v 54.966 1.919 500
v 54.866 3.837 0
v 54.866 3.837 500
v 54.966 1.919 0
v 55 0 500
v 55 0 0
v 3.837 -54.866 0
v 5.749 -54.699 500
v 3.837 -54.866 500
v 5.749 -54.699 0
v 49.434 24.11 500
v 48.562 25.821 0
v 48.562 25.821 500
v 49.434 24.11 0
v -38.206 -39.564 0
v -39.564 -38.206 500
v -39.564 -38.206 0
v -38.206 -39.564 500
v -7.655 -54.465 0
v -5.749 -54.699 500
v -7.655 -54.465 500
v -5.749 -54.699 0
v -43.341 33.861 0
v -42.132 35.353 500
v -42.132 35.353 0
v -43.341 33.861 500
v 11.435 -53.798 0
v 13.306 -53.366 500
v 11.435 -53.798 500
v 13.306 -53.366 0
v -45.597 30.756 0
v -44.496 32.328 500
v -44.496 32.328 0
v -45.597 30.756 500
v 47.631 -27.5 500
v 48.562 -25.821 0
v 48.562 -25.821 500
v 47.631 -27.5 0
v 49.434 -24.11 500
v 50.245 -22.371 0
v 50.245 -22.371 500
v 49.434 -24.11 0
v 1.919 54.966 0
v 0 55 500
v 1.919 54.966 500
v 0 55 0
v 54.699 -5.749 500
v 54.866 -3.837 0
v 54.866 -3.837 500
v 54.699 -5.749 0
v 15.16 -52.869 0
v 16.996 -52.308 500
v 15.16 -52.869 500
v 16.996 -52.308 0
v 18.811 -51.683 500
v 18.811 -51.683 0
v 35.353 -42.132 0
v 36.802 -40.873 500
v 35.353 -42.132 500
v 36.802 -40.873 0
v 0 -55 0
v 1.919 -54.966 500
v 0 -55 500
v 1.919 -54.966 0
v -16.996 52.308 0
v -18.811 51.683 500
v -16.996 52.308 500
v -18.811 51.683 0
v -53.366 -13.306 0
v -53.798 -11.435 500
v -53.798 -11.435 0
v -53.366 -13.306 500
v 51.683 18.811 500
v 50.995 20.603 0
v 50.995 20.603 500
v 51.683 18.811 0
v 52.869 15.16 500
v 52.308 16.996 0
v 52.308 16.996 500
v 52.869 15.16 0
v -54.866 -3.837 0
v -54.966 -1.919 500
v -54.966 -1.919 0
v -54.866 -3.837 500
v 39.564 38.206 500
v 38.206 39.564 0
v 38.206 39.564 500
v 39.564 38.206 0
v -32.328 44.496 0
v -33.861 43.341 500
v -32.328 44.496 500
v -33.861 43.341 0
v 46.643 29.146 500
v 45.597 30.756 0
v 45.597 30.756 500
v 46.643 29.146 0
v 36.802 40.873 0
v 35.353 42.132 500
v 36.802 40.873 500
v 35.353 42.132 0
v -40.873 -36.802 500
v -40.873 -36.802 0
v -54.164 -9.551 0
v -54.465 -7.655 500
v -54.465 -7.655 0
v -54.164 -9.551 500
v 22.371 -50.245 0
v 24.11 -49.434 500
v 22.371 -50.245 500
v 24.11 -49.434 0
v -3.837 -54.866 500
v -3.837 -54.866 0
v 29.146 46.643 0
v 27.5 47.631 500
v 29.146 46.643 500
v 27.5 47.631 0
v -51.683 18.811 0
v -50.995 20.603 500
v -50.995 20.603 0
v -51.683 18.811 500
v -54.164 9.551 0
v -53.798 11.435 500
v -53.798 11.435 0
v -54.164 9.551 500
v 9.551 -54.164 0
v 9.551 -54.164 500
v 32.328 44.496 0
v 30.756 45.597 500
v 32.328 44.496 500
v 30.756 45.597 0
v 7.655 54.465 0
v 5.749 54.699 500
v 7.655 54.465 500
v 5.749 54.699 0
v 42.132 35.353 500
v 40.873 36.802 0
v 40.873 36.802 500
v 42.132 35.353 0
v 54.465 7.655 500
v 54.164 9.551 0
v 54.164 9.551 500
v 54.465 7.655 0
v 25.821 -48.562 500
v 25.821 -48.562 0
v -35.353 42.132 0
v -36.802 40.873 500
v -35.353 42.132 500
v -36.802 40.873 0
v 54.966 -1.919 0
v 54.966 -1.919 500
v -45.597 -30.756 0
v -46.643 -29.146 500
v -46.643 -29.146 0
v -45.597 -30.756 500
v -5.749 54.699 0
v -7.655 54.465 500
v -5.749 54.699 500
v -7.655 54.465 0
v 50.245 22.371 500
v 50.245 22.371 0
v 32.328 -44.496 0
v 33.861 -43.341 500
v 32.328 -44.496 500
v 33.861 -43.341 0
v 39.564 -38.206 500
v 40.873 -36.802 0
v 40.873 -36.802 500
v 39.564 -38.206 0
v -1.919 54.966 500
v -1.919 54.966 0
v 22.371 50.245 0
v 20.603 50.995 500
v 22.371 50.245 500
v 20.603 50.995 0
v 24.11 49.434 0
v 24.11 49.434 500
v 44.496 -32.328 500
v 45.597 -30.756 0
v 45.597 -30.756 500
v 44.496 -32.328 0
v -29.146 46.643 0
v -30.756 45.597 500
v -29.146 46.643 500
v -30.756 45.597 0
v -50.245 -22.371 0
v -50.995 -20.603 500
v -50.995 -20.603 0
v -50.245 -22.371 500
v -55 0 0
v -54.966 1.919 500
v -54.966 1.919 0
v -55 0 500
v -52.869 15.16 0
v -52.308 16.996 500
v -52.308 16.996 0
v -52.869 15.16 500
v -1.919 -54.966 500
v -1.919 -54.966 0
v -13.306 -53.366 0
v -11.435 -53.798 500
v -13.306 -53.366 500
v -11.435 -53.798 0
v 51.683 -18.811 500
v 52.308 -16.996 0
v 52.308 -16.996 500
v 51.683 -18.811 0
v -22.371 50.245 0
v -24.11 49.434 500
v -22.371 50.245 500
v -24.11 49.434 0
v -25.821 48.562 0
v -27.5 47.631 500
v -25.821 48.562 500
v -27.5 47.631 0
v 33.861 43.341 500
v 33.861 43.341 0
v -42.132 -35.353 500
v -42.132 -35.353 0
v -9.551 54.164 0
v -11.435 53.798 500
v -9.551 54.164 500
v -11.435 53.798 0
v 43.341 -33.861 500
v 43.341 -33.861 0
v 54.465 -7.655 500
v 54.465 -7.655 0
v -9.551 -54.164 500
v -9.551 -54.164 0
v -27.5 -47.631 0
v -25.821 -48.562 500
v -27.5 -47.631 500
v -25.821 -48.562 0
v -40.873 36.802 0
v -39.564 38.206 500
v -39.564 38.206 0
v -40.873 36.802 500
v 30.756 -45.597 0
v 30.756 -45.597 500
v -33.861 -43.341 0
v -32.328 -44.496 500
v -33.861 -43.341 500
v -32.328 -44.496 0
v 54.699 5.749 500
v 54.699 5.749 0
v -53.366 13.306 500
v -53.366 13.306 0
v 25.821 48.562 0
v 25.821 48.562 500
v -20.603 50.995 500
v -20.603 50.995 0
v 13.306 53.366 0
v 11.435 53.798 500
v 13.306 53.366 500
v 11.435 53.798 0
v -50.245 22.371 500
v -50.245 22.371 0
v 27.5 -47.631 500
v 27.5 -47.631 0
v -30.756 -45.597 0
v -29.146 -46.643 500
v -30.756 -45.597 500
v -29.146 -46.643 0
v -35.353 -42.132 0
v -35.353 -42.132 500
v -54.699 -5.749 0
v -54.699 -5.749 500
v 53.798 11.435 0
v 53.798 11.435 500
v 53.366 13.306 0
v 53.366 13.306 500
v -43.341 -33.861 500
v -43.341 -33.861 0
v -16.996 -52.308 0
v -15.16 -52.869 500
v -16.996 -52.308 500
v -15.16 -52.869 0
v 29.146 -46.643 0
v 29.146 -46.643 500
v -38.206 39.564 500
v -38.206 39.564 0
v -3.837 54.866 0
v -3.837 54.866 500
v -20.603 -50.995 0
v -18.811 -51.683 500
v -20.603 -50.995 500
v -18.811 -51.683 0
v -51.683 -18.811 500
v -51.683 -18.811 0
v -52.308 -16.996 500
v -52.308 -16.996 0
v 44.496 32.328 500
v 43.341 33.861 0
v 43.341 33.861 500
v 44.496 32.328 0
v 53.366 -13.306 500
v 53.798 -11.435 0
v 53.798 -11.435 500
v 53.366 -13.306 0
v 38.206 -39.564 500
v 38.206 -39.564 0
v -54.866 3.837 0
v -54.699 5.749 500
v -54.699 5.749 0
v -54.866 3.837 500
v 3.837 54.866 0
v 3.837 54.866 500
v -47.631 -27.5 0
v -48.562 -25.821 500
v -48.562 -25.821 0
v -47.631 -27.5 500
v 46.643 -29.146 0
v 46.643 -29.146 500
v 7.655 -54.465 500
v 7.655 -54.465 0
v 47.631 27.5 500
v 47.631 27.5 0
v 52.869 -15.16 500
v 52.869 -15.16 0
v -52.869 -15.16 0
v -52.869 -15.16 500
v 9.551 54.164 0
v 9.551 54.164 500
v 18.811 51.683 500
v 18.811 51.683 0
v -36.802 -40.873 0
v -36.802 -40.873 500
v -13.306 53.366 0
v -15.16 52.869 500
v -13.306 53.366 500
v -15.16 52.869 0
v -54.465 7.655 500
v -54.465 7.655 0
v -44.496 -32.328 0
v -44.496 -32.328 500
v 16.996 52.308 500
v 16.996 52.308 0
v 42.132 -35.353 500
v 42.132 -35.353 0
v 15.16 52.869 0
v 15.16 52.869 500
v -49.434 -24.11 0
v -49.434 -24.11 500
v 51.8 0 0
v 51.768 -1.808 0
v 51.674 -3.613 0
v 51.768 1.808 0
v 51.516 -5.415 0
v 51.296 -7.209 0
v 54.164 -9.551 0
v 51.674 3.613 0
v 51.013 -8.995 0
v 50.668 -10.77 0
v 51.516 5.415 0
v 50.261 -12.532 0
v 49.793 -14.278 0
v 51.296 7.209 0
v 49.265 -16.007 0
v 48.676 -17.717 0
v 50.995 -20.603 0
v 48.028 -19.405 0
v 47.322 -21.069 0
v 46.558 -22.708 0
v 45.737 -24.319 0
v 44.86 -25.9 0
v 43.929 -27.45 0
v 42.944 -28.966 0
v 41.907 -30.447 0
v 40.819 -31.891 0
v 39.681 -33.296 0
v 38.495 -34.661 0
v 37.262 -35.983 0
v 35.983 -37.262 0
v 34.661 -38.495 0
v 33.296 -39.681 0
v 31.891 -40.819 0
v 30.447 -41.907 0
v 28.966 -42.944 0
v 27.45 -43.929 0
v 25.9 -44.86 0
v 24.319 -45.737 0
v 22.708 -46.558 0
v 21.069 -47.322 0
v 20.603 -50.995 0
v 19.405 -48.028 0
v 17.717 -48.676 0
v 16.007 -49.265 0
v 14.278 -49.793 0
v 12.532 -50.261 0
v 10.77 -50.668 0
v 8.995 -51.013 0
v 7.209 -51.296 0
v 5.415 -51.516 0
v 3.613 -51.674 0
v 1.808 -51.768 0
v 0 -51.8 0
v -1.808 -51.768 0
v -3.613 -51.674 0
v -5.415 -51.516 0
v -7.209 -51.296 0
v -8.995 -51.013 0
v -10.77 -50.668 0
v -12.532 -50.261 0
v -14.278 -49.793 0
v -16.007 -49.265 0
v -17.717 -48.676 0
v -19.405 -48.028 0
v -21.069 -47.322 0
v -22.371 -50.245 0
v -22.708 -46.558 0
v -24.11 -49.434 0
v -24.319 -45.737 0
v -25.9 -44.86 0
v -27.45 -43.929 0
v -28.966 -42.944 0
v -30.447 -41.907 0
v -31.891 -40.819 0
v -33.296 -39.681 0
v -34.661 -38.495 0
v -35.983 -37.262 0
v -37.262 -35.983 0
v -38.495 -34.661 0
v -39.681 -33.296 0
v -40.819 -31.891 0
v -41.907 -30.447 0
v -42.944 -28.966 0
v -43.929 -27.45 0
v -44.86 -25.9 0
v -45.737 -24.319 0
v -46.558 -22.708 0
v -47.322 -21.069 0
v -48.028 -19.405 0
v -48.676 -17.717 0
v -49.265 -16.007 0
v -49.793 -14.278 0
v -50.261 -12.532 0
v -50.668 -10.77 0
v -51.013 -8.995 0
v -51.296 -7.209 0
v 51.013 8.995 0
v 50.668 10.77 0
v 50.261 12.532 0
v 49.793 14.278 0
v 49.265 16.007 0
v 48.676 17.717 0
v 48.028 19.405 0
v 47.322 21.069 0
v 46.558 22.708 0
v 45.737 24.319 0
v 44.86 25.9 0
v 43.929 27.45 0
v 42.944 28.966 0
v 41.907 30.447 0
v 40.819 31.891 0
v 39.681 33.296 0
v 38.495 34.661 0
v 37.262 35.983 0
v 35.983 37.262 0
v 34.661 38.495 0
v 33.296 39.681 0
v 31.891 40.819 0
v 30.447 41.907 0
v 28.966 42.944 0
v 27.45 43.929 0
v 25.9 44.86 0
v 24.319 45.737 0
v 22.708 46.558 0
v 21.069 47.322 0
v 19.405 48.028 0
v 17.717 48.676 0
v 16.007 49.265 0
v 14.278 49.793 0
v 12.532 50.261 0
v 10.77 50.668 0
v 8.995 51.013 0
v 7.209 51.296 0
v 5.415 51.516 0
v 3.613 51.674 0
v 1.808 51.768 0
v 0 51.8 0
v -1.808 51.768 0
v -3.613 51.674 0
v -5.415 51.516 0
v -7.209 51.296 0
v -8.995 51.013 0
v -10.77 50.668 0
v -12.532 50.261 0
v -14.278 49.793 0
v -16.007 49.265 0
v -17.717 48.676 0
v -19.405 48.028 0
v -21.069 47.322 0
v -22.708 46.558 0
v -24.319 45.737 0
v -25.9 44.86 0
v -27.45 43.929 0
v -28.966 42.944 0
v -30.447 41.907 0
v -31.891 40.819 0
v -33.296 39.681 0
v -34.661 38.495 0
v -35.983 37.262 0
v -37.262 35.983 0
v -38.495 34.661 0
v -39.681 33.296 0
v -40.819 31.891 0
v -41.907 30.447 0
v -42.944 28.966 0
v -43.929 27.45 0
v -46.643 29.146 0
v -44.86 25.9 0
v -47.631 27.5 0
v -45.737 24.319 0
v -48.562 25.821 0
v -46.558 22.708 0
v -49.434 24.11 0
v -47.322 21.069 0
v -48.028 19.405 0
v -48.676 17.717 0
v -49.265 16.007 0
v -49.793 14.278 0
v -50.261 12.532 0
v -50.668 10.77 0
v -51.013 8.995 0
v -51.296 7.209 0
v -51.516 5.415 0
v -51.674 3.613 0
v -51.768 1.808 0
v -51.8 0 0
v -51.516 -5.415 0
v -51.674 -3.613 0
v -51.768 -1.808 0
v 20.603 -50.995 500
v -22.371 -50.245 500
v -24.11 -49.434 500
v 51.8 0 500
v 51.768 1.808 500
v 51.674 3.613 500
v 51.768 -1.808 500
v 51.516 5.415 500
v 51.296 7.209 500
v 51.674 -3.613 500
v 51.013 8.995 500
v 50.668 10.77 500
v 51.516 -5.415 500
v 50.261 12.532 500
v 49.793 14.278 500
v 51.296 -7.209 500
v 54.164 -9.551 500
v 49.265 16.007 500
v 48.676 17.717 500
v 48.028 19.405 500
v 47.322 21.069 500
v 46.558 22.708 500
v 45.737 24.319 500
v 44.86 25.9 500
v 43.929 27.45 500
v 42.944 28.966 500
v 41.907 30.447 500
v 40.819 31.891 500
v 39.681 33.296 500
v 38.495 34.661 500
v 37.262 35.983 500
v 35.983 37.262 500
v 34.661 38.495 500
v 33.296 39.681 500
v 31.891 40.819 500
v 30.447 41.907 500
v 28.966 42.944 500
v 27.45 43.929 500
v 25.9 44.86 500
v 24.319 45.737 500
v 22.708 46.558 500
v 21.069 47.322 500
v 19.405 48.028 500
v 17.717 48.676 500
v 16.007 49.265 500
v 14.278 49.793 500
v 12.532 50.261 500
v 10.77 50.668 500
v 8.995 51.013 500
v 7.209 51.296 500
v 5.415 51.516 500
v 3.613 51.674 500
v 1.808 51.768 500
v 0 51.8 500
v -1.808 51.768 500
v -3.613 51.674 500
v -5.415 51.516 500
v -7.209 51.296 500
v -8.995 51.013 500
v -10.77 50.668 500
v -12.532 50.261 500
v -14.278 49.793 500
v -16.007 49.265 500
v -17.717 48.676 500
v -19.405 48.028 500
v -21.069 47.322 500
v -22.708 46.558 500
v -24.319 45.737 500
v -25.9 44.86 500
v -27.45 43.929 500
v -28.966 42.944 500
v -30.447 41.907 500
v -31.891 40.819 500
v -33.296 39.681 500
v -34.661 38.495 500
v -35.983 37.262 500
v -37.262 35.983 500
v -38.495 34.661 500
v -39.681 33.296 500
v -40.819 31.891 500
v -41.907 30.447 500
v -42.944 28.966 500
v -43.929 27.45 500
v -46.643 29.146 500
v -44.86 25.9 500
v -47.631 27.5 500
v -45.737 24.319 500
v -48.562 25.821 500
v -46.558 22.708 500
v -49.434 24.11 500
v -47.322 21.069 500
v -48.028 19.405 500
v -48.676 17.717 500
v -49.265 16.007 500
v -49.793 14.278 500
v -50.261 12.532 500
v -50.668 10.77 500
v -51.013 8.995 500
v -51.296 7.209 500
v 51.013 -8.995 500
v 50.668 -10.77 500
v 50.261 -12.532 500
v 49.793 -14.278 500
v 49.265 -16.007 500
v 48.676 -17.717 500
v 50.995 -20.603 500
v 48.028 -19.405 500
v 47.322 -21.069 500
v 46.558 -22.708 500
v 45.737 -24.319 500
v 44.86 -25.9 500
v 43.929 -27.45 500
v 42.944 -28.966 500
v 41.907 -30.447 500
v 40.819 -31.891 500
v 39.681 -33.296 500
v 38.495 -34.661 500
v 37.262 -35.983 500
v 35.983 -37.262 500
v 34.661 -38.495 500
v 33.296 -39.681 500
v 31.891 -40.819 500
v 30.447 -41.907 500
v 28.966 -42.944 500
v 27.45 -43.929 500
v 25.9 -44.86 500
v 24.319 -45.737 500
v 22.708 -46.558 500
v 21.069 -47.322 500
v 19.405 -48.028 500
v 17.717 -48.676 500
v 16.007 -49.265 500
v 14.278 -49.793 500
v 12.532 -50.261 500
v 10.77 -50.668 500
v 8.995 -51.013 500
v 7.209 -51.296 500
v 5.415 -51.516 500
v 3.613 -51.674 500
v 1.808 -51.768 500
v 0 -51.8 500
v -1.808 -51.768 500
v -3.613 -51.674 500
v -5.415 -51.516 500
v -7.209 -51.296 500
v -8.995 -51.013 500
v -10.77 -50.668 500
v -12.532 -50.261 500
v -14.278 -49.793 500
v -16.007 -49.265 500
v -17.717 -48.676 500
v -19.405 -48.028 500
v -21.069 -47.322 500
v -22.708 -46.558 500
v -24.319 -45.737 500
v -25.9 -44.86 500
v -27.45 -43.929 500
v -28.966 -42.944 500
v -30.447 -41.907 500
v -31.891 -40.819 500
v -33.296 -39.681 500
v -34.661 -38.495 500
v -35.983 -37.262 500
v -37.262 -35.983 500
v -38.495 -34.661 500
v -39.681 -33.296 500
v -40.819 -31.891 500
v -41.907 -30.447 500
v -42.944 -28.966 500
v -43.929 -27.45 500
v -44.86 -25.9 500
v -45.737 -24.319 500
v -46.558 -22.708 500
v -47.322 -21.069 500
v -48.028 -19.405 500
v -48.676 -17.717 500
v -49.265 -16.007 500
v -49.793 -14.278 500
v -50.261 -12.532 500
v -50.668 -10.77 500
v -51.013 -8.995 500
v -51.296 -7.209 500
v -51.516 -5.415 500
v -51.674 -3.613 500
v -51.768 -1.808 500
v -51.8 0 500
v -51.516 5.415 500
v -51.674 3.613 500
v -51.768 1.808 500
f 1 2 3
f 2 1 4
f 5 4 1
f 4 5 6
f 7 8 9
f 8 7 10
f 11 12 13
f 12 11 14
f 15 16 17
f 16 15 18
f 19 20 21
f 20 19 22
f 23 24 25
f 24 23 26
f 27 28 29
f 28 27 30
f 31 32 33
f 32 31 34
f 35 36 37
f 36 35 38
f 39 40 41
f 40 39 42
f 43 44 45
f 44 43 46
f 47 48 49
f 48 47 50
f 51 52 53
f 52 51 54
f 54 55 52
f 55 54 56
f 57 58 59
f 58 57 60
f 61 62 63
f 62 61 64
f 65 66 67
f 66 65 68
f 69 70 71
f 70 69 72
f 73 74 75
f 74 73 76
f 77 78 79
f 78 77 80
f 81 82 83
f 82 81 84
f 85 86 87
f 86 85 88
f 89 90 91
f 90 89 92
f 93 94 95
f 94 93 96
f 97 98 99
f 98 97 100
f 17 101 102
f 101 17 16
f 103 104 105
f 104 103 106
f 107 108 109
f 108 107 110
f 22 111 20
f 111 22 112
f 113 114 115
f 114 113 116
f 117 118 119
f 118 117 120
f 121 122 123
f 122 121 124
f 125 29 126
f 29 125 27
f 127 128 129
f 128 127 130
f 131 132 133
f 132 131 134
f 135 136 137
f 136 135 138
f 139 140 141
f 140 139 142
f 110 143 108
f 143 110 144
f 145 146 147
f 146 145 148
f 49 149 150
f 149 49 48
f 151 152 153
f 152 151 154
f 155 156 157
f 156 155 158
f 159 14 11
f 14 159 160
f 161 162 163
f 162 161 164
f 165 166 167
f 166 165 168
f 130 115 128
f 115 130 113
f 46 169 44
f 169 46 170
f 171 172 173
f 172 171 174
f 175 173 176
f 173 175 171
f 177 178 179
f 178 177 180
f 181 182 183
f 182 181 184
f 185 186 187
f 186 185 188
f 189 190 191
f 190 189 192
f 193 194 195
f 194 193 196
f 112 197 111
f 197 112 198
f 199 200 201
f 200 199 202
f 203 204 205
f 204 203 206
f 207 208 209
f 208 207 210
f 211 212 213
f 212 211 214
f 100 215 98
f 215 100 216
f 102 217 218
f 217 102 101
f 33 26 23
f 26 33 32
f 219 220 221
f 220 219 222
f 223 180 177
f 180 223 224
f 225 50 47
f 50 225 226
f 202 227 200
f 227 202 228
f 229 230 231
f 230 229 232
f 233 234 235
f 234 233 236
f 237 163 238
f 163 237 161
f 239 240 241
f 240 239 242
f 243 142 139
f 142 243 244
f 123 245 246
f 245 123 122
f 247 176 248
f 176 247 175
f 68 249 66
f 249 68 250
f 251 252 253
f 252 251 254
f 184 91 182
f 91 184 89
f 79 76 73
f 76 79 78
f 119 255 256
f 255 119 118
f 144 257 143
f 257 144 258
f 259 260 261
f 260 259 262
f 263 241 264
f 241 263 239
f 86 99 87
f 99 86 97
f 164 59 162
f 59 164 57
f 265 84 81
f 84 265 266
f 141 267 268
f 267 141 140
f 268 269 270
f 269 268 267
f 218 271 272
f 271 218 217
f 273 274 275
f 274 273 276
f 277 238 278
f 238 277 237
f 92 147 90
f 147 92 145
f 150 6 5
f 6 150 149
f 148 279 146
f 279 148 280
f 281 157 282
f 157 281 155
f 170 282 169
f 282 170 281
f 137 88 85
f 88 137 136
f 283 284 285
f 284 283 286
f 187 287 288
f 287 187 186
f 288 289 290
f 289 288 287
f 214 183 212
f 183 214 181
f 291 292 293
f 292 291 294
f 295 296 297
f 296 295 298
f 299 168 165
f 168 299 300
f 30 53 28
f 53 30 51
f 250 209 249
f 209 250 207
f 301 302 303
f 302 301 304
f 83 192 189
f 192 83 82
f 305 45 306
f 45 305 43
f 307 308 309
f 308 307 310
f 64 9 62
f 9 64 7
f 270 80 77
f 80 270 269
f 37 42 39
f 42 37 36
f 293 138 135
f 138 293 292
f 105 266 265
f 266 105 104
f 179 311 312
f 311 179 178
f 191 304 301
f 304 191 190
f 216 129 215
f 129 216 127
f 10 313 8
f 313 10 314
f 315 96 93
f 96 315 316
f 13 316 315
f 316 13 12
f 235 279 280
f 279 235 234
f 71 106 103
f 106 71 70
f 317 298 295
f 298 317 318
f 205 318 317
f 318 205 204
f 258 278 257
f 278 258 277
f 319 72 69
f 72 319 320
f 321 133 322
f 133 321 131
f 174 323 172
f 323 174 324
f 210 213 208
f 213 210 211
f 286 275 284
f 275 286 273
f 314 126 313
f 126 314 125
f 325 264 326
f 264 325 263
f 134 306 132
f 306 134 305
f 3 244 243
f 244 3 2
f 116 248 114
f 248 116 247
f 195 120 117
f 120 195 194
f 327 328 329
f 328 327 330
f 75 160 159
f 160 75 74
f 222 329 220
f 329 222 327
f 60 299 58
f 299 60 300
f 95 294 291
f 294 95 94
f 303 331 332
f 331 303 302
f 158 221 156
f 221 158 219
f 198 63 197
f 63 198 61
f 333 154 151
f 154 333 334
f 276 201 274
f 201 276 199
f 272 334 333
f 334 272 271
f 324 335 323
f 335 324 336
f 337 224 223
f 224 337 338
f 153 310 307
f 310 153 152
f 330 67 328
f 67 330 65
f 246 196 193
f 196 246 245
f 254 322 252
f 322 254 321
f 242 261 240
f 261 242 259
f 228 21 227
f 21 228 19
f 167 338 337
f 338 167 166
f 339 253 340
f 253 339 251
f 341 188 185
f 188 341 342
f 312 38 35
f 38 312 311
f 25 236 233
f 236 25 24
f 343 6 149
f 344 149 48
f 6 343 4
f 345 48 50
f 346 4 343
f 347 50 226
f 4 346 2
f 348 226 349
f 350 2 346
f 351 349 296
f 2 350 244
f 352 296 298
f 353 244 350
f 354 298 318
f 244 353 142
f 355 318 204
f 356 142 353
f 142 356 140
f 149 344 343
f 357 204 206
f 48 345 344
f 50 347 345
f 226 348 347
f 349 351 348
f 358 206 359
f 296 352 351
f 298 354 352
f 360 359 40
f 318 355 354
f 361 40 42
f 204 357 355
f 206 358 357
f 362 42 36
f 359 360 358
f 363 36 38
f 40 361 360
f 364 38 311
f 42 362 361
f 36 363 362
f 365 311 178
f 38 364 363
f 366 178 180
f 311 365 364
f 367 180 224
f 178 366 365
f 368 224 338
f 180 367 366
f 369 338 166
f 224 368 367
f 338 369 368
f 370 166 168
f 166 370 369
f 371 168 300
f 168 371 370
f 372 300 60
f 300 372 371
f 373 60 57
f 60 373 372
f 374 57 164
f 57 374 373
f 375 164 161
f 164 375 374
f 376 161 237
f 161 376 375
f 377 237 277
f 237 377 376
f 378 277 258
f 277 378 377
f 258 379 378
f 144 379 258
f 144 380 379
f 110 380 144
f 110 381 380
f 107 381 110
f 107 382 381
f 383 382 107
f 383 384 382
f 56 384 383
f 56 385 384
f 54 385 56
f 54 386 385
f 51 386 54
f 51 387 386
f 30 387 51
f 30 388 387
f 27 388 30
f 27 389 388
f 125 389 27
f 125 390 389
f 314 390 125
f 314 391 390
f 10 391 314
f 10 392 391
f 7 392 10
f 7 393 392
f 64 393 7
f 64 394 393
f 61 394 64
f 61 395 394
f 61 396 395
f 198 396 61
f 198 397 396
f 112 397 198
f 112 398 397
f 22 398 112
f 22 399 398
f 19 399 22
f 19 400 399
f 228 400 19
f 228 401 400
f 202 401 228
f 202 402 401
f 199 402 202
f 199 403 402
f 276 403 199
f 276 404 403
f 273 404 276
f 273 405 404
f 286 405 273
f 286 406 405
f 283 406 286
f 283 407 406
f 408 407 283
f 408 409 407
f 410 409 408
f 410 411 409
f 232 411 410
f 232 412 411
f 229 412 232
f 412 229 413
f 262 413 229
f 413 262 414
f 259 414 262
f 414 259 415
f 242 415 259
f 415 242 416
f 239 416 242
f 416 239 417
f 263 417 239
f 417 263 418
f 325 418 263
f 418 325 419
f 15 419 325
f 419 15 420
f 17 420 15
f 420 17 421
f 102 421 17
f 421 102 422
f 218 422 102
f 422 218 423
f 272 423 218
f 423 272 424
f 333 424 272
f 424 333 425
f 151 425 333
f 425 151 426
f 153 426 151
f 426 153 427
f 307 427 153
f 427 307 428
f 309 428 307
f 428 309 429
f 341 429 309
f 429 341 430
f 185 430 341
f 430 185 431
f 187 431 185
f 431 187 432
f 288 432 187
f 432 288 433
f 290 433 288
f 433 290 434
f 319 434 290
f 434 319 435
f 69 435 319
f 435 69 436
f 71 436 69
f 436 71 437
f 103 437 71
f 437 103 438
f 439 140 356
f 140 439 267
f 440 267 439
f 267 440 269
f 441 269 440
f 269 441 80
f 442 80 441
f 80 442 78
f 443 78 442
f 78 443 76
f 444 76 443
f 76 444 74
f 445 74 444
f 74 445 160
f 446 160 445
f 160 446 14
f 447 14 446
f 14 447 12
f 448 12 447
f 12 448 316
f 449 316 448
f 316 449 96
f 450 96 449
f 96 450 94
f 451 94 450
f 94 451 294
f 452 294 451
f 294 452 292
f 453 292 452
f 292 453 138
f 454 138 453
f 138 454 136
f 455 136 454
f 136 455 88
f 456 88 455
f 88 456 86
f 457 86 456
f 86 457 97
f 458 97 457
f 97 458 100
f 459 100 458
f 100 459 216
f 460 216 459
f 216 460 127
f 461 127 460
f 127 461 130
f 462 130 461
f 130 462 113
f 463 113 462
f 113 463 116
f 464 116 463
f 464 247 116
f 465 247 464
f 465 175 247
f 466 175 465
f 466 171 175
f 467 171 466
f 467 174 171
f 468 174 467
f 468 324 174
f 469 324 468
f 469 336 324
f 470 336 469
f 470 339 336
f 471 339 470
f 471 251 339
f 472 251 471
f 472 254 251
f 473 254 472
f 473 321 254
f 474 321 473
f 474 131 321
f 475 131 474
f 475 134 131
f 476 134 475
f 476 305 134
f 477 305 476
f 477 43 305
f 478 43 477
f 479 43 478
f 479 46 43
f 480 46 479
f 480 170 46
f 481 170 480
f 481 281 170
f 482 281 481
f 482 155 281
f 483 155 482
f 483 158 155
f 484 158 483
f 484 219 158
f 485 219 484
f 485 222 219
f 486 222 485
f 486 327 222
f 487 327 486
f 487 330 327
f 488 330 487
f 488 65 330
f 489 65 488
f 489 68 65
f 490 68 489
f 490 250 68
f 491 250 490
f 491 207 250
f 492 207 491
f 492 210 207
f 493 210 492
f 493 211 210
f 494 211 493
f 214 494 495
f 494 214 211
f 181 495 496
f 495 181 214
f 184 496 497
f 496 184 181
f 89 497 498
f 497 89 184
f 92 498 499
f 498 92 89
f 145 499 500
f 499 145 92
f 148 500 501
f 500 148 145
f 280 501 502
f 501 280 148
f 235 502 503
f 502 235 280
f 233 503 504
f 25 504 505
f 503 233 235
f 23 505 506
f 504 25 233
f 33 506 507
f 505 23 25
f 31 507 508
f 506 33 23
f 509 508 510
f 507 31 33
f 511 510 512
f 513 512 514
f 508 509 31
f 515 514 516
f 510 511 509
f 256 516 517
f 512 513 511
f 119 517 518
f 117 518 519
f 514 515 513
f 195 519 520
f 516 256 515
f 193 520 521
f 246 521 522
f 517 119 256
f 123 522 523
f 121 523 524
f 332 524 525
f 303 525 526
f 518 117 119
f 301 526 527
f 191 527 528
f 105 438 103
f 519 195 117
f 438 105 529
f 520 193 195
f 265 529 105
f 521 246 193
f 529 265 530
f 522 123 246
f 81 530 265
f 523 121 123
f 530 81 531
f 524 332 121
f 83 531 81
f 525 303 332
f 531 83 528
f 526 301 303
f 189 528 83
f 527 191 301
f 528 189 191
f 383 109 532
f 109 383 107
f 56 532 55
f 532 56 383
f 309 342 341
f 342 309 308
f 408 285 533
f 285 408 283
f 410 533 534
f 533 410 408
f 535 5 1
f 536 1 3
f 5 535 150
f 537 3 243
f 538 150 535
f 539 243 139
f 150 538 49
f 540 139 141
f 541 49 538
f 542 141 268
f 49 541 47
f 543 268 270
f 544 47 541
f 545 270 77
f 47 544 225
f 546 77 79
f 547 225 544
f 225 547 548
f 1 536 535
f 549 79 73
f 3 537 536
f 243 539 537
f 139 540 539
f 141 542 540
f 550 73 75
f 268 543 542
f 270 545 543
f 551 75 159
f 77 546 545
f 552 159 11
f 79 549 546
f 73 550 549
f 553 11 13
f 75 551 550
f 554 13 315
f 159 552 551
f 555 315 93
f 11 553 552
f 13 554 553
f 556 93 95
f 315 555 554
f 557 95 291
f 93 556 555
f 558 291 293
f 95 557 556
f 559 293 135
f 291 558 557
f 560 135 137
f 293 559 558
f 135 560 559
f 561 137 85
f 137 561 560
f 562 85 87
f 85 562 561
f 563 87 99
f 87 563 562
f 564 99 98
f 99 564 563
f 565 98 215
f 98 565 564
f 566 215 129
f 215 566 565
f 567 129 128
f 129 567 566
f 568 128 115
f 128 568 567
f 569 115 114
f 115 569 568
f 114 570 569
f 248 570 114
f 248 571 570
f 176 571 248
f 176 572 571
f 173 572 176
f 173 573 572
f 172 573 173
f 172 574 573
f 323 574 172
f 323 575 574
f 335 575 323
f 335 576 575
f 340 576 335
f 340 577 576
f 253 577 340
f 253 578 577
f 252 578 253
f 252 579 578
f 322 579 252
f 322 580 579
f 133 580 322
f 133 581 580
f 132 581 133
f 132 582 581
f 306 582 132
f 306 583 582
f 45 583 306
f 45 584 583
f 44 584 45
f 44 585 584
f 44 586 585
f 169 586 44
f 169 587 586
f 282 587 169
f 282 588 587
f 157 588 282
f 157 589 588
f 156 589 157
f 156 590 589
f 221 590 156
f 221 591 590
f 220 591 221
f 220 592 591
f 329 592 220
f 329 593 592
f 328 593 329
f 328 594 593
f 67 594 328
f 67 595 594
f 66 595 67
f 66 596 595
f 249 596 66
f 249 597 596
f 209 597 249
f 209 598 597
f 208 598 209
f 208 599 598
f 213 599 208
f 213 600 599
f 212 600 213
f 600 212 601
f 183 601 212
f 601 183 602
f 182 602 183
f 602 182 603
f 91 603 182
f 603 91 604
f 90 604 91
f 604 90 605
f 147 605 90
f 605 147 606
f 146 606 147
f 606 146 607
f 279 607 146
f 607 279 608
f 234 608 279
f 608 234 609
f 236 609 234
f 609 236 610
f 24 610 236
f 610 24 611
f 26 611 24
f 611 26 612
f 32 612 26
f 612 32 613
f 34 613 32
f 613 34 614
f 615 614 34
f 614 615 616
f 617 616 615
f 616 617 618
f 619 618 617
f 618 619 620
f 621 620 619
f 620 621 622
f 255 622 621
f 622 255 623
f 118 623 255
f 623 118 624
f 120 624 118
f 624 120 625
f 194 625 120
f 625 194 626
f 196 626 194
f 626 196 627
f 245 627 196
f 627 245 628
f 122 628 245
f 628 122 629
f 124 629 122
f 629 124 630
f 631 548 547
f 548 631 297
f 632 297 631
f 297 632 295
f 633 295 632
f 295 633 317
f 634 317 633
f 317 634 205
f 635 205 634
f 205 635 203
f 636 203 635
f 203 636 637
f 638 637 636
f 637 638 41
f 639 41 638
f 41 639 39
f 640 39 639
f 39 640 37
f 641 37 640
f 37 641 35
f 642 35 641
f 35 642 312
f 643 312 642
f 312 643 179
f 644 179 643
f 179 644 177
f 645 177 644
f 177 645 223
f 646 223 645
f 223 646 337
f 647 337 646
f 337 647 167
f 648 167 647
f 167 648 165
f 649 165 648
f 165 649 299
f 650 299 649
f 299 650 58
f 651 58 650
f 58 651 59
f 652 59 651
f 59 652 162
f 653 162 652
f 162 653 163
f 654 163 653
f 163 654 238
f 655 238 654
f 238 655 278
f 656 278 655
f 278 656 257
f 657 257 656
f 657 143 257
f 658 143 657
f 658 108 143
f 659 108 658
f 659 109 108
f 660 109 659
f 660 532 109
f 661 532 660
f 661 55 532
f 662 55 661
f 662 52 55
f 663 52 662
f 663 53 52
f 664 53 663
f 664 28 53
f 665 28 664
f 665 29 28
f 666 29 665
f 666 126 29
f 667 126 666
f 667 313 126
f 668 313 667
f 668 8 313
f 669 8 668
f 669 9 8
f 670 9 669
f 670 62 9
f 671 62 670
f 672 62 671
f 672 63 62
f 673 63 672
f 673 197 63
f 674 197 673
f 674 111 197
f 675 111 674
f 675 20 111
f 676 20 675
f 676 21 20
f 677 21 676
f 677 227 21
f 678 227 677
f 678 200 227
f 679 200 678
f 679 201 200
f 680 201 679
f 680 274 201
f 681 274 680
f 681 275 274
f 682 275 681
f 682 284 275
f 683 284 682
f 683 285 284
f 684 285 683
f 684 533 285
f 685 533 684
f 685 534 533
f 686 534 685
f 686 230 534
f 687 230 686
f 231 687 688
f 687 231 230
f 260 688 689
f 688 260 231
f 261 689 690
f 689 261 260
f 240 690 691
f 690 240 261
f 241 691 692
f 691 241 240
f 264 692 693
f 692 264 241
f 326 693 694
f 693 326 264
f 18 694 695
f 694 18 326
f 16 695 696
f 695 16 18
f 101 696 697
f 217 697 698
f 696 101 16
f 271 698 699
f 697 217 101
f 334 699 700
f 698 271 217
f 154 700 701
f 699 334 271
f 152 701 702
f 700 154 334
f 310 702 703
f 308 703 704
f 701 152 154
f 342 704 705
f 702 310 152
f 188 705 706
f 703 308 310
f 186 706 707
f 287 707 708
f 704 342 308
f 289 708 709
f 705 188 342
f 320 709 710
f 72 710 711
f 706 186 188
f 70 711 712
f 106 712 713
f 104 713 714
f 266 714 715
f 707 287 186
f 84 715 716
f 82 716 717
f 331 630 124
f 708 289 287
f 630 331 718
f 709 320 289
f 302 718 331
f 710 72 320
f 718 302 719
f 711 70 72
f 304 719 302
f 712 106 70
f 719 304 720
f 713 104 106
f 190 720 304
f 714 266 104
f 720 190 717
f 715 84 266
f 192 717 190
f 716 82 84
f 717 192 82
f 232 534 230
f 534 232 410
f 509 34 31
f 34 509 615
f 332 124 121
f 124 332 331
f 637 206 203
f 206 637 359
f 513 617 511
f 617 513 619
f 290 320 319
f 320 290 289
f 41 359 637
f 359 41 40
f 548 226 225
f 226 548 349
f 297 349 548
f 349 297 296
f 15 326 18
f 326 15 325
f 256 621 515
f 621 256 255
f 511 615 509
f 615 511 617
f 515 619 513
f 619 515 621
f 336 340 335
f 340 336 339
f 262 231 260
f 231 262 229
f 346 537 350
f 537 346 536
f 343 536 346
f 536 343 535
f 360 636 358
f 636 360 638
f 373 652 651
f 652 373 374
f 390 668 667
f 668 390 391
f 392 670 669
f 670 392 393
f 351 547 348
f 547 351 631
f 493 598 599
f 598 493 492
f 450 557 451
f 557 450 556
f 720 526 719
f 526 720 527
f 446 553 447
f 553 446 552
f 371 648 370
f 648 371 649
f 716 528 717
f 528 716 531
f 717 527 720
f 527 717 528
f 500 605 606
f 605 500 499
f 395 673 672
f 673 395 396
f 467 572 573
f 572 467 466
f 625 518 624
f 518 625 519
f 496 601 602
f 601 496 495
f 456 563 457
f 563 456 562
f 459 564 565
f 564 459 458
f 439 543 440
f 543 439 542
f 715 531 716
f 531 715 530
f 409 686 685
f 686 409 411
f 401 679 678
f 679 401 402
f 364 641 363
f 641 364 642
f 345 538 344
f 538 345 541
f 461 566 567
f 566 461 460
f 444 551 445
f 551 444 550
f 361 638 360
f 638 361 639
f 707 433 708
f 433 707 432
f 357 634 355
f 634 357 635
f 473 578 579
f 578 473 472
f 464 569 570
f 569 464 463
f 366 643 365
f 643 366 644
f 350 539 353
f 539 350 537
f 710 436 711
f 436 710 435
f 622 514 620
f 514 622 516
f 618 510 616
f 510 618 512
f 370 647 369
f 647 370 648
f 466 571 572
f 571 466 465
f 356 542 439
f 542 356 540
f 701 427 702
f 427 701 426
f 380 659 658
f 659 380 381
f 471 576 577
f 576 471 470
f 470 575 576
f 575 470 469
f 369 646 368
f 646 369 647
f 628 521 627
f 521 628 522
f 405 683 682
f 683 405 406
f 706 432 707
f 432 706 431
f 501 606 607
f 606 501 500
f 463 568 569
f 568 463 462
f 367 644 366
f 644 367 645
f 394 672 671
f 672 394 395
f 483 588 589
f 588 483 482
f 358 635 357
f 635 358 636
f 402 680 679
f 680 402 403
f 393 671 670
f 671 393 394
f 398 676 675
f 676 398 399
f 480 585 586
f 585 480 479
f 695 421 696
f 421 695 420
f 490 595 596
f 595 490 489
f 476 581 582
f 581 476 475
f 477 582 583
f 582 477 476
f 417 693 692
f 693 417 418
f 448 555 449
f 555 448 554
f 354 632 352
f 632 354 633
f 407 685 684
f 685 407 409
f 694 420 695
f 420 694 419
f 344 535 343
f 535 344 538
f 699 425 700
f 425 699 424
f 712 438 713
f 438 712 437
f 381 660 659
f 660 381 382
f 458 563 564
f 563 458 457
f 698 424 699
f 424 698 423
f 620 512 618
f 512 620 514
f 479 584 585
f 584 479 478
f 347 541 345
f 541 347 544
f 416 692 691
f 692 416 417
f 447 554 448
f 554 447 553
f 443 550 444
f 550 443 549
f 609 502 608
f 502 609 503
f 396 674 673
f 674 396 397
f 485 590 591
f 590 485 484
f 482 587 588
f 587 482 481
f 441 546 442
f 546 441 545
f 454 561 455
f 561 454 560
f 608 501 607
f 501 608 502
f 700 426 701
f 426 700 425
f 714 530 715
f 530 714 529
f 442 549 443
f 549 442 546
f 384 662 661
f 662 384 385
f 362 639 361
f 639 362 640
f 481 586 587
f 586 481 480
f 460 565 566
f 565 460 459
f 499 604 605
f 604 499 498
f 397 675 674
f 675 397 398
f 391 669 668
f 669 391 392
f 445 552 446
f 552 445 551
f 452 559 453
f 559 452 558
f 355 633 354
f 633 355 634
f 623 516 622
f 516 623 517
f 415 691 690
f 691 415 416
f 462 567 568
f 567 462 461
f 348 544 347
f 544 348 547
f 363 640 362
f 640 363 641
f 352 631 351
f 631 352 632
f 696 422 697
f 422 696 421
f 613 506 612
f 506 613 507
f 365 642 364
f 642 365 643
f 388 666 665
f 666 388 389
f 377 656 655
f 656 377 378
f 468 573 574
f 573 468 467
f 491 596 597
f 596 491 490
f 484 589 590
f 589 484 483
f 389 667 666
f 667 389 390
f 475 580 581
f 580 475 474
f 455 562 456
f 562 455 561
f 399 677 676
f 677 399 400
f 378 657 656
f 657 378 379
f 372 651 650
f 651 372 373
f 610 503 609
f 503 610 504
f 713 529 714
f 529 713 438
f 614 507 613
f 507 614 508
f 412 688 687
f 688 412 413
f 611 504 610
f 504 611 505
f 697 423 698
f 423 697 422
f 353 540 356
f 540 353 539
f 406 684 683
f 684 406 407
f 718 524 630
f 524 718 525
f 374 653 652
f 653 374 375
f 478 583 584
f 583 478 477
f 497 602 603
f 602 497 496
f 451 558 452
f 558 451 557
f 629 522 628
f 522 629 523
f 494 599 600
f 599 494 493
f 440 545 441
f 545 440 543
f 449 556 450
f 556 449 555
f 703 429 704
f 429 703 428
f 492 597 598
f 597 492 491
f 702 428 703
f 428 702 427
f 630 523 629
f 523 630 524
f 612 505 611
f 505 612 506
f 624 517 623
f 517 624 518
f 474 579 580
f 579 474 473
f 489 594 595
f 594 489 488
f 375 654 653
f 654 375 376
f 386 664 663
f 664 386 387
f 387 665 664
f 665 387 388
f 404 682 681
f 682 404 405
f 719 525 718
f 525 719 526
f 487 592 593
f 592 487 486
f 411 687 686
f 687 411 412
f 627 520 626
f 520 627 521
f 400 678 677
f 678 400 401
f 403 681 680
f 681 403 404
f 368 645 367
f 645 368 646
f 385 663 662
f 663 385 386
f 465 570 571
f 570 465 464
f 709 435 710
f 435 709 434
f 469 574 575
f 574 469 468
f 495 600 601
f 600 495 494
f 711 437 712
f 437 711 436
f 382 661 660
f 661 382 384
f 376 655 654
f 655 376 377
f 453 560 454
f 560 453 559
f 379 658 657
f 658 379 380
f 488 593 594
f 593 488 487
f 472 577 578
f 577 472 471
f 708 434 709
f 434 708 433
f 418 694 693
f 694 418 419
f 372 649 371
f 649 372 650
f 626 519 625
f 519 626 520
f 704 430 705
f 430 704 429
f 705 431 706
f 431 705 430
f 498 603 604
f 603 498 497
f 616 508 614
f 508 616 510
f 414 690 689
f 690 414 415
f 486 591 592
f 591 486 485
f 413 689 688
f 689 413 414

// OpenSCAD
$fn = 180;

// HT pipe parameters (approximate for HT 110)
outer_d = 110;      // mm
wall = 3.2;         // mm (typical HT/SML-like wall thickness approximation)
length = 500;       // mm

inner_d = outer_d - 2*wall;

module ht_pipe(od, id, h) {
    difference() {
        cylinder(d=od, h=h, center=false);
        translate([0,0,-0.1]) cylinder(d=id, h=h+0.2, center=false);
    }
}

ht_pipe(outer_d, inner_d, length);
